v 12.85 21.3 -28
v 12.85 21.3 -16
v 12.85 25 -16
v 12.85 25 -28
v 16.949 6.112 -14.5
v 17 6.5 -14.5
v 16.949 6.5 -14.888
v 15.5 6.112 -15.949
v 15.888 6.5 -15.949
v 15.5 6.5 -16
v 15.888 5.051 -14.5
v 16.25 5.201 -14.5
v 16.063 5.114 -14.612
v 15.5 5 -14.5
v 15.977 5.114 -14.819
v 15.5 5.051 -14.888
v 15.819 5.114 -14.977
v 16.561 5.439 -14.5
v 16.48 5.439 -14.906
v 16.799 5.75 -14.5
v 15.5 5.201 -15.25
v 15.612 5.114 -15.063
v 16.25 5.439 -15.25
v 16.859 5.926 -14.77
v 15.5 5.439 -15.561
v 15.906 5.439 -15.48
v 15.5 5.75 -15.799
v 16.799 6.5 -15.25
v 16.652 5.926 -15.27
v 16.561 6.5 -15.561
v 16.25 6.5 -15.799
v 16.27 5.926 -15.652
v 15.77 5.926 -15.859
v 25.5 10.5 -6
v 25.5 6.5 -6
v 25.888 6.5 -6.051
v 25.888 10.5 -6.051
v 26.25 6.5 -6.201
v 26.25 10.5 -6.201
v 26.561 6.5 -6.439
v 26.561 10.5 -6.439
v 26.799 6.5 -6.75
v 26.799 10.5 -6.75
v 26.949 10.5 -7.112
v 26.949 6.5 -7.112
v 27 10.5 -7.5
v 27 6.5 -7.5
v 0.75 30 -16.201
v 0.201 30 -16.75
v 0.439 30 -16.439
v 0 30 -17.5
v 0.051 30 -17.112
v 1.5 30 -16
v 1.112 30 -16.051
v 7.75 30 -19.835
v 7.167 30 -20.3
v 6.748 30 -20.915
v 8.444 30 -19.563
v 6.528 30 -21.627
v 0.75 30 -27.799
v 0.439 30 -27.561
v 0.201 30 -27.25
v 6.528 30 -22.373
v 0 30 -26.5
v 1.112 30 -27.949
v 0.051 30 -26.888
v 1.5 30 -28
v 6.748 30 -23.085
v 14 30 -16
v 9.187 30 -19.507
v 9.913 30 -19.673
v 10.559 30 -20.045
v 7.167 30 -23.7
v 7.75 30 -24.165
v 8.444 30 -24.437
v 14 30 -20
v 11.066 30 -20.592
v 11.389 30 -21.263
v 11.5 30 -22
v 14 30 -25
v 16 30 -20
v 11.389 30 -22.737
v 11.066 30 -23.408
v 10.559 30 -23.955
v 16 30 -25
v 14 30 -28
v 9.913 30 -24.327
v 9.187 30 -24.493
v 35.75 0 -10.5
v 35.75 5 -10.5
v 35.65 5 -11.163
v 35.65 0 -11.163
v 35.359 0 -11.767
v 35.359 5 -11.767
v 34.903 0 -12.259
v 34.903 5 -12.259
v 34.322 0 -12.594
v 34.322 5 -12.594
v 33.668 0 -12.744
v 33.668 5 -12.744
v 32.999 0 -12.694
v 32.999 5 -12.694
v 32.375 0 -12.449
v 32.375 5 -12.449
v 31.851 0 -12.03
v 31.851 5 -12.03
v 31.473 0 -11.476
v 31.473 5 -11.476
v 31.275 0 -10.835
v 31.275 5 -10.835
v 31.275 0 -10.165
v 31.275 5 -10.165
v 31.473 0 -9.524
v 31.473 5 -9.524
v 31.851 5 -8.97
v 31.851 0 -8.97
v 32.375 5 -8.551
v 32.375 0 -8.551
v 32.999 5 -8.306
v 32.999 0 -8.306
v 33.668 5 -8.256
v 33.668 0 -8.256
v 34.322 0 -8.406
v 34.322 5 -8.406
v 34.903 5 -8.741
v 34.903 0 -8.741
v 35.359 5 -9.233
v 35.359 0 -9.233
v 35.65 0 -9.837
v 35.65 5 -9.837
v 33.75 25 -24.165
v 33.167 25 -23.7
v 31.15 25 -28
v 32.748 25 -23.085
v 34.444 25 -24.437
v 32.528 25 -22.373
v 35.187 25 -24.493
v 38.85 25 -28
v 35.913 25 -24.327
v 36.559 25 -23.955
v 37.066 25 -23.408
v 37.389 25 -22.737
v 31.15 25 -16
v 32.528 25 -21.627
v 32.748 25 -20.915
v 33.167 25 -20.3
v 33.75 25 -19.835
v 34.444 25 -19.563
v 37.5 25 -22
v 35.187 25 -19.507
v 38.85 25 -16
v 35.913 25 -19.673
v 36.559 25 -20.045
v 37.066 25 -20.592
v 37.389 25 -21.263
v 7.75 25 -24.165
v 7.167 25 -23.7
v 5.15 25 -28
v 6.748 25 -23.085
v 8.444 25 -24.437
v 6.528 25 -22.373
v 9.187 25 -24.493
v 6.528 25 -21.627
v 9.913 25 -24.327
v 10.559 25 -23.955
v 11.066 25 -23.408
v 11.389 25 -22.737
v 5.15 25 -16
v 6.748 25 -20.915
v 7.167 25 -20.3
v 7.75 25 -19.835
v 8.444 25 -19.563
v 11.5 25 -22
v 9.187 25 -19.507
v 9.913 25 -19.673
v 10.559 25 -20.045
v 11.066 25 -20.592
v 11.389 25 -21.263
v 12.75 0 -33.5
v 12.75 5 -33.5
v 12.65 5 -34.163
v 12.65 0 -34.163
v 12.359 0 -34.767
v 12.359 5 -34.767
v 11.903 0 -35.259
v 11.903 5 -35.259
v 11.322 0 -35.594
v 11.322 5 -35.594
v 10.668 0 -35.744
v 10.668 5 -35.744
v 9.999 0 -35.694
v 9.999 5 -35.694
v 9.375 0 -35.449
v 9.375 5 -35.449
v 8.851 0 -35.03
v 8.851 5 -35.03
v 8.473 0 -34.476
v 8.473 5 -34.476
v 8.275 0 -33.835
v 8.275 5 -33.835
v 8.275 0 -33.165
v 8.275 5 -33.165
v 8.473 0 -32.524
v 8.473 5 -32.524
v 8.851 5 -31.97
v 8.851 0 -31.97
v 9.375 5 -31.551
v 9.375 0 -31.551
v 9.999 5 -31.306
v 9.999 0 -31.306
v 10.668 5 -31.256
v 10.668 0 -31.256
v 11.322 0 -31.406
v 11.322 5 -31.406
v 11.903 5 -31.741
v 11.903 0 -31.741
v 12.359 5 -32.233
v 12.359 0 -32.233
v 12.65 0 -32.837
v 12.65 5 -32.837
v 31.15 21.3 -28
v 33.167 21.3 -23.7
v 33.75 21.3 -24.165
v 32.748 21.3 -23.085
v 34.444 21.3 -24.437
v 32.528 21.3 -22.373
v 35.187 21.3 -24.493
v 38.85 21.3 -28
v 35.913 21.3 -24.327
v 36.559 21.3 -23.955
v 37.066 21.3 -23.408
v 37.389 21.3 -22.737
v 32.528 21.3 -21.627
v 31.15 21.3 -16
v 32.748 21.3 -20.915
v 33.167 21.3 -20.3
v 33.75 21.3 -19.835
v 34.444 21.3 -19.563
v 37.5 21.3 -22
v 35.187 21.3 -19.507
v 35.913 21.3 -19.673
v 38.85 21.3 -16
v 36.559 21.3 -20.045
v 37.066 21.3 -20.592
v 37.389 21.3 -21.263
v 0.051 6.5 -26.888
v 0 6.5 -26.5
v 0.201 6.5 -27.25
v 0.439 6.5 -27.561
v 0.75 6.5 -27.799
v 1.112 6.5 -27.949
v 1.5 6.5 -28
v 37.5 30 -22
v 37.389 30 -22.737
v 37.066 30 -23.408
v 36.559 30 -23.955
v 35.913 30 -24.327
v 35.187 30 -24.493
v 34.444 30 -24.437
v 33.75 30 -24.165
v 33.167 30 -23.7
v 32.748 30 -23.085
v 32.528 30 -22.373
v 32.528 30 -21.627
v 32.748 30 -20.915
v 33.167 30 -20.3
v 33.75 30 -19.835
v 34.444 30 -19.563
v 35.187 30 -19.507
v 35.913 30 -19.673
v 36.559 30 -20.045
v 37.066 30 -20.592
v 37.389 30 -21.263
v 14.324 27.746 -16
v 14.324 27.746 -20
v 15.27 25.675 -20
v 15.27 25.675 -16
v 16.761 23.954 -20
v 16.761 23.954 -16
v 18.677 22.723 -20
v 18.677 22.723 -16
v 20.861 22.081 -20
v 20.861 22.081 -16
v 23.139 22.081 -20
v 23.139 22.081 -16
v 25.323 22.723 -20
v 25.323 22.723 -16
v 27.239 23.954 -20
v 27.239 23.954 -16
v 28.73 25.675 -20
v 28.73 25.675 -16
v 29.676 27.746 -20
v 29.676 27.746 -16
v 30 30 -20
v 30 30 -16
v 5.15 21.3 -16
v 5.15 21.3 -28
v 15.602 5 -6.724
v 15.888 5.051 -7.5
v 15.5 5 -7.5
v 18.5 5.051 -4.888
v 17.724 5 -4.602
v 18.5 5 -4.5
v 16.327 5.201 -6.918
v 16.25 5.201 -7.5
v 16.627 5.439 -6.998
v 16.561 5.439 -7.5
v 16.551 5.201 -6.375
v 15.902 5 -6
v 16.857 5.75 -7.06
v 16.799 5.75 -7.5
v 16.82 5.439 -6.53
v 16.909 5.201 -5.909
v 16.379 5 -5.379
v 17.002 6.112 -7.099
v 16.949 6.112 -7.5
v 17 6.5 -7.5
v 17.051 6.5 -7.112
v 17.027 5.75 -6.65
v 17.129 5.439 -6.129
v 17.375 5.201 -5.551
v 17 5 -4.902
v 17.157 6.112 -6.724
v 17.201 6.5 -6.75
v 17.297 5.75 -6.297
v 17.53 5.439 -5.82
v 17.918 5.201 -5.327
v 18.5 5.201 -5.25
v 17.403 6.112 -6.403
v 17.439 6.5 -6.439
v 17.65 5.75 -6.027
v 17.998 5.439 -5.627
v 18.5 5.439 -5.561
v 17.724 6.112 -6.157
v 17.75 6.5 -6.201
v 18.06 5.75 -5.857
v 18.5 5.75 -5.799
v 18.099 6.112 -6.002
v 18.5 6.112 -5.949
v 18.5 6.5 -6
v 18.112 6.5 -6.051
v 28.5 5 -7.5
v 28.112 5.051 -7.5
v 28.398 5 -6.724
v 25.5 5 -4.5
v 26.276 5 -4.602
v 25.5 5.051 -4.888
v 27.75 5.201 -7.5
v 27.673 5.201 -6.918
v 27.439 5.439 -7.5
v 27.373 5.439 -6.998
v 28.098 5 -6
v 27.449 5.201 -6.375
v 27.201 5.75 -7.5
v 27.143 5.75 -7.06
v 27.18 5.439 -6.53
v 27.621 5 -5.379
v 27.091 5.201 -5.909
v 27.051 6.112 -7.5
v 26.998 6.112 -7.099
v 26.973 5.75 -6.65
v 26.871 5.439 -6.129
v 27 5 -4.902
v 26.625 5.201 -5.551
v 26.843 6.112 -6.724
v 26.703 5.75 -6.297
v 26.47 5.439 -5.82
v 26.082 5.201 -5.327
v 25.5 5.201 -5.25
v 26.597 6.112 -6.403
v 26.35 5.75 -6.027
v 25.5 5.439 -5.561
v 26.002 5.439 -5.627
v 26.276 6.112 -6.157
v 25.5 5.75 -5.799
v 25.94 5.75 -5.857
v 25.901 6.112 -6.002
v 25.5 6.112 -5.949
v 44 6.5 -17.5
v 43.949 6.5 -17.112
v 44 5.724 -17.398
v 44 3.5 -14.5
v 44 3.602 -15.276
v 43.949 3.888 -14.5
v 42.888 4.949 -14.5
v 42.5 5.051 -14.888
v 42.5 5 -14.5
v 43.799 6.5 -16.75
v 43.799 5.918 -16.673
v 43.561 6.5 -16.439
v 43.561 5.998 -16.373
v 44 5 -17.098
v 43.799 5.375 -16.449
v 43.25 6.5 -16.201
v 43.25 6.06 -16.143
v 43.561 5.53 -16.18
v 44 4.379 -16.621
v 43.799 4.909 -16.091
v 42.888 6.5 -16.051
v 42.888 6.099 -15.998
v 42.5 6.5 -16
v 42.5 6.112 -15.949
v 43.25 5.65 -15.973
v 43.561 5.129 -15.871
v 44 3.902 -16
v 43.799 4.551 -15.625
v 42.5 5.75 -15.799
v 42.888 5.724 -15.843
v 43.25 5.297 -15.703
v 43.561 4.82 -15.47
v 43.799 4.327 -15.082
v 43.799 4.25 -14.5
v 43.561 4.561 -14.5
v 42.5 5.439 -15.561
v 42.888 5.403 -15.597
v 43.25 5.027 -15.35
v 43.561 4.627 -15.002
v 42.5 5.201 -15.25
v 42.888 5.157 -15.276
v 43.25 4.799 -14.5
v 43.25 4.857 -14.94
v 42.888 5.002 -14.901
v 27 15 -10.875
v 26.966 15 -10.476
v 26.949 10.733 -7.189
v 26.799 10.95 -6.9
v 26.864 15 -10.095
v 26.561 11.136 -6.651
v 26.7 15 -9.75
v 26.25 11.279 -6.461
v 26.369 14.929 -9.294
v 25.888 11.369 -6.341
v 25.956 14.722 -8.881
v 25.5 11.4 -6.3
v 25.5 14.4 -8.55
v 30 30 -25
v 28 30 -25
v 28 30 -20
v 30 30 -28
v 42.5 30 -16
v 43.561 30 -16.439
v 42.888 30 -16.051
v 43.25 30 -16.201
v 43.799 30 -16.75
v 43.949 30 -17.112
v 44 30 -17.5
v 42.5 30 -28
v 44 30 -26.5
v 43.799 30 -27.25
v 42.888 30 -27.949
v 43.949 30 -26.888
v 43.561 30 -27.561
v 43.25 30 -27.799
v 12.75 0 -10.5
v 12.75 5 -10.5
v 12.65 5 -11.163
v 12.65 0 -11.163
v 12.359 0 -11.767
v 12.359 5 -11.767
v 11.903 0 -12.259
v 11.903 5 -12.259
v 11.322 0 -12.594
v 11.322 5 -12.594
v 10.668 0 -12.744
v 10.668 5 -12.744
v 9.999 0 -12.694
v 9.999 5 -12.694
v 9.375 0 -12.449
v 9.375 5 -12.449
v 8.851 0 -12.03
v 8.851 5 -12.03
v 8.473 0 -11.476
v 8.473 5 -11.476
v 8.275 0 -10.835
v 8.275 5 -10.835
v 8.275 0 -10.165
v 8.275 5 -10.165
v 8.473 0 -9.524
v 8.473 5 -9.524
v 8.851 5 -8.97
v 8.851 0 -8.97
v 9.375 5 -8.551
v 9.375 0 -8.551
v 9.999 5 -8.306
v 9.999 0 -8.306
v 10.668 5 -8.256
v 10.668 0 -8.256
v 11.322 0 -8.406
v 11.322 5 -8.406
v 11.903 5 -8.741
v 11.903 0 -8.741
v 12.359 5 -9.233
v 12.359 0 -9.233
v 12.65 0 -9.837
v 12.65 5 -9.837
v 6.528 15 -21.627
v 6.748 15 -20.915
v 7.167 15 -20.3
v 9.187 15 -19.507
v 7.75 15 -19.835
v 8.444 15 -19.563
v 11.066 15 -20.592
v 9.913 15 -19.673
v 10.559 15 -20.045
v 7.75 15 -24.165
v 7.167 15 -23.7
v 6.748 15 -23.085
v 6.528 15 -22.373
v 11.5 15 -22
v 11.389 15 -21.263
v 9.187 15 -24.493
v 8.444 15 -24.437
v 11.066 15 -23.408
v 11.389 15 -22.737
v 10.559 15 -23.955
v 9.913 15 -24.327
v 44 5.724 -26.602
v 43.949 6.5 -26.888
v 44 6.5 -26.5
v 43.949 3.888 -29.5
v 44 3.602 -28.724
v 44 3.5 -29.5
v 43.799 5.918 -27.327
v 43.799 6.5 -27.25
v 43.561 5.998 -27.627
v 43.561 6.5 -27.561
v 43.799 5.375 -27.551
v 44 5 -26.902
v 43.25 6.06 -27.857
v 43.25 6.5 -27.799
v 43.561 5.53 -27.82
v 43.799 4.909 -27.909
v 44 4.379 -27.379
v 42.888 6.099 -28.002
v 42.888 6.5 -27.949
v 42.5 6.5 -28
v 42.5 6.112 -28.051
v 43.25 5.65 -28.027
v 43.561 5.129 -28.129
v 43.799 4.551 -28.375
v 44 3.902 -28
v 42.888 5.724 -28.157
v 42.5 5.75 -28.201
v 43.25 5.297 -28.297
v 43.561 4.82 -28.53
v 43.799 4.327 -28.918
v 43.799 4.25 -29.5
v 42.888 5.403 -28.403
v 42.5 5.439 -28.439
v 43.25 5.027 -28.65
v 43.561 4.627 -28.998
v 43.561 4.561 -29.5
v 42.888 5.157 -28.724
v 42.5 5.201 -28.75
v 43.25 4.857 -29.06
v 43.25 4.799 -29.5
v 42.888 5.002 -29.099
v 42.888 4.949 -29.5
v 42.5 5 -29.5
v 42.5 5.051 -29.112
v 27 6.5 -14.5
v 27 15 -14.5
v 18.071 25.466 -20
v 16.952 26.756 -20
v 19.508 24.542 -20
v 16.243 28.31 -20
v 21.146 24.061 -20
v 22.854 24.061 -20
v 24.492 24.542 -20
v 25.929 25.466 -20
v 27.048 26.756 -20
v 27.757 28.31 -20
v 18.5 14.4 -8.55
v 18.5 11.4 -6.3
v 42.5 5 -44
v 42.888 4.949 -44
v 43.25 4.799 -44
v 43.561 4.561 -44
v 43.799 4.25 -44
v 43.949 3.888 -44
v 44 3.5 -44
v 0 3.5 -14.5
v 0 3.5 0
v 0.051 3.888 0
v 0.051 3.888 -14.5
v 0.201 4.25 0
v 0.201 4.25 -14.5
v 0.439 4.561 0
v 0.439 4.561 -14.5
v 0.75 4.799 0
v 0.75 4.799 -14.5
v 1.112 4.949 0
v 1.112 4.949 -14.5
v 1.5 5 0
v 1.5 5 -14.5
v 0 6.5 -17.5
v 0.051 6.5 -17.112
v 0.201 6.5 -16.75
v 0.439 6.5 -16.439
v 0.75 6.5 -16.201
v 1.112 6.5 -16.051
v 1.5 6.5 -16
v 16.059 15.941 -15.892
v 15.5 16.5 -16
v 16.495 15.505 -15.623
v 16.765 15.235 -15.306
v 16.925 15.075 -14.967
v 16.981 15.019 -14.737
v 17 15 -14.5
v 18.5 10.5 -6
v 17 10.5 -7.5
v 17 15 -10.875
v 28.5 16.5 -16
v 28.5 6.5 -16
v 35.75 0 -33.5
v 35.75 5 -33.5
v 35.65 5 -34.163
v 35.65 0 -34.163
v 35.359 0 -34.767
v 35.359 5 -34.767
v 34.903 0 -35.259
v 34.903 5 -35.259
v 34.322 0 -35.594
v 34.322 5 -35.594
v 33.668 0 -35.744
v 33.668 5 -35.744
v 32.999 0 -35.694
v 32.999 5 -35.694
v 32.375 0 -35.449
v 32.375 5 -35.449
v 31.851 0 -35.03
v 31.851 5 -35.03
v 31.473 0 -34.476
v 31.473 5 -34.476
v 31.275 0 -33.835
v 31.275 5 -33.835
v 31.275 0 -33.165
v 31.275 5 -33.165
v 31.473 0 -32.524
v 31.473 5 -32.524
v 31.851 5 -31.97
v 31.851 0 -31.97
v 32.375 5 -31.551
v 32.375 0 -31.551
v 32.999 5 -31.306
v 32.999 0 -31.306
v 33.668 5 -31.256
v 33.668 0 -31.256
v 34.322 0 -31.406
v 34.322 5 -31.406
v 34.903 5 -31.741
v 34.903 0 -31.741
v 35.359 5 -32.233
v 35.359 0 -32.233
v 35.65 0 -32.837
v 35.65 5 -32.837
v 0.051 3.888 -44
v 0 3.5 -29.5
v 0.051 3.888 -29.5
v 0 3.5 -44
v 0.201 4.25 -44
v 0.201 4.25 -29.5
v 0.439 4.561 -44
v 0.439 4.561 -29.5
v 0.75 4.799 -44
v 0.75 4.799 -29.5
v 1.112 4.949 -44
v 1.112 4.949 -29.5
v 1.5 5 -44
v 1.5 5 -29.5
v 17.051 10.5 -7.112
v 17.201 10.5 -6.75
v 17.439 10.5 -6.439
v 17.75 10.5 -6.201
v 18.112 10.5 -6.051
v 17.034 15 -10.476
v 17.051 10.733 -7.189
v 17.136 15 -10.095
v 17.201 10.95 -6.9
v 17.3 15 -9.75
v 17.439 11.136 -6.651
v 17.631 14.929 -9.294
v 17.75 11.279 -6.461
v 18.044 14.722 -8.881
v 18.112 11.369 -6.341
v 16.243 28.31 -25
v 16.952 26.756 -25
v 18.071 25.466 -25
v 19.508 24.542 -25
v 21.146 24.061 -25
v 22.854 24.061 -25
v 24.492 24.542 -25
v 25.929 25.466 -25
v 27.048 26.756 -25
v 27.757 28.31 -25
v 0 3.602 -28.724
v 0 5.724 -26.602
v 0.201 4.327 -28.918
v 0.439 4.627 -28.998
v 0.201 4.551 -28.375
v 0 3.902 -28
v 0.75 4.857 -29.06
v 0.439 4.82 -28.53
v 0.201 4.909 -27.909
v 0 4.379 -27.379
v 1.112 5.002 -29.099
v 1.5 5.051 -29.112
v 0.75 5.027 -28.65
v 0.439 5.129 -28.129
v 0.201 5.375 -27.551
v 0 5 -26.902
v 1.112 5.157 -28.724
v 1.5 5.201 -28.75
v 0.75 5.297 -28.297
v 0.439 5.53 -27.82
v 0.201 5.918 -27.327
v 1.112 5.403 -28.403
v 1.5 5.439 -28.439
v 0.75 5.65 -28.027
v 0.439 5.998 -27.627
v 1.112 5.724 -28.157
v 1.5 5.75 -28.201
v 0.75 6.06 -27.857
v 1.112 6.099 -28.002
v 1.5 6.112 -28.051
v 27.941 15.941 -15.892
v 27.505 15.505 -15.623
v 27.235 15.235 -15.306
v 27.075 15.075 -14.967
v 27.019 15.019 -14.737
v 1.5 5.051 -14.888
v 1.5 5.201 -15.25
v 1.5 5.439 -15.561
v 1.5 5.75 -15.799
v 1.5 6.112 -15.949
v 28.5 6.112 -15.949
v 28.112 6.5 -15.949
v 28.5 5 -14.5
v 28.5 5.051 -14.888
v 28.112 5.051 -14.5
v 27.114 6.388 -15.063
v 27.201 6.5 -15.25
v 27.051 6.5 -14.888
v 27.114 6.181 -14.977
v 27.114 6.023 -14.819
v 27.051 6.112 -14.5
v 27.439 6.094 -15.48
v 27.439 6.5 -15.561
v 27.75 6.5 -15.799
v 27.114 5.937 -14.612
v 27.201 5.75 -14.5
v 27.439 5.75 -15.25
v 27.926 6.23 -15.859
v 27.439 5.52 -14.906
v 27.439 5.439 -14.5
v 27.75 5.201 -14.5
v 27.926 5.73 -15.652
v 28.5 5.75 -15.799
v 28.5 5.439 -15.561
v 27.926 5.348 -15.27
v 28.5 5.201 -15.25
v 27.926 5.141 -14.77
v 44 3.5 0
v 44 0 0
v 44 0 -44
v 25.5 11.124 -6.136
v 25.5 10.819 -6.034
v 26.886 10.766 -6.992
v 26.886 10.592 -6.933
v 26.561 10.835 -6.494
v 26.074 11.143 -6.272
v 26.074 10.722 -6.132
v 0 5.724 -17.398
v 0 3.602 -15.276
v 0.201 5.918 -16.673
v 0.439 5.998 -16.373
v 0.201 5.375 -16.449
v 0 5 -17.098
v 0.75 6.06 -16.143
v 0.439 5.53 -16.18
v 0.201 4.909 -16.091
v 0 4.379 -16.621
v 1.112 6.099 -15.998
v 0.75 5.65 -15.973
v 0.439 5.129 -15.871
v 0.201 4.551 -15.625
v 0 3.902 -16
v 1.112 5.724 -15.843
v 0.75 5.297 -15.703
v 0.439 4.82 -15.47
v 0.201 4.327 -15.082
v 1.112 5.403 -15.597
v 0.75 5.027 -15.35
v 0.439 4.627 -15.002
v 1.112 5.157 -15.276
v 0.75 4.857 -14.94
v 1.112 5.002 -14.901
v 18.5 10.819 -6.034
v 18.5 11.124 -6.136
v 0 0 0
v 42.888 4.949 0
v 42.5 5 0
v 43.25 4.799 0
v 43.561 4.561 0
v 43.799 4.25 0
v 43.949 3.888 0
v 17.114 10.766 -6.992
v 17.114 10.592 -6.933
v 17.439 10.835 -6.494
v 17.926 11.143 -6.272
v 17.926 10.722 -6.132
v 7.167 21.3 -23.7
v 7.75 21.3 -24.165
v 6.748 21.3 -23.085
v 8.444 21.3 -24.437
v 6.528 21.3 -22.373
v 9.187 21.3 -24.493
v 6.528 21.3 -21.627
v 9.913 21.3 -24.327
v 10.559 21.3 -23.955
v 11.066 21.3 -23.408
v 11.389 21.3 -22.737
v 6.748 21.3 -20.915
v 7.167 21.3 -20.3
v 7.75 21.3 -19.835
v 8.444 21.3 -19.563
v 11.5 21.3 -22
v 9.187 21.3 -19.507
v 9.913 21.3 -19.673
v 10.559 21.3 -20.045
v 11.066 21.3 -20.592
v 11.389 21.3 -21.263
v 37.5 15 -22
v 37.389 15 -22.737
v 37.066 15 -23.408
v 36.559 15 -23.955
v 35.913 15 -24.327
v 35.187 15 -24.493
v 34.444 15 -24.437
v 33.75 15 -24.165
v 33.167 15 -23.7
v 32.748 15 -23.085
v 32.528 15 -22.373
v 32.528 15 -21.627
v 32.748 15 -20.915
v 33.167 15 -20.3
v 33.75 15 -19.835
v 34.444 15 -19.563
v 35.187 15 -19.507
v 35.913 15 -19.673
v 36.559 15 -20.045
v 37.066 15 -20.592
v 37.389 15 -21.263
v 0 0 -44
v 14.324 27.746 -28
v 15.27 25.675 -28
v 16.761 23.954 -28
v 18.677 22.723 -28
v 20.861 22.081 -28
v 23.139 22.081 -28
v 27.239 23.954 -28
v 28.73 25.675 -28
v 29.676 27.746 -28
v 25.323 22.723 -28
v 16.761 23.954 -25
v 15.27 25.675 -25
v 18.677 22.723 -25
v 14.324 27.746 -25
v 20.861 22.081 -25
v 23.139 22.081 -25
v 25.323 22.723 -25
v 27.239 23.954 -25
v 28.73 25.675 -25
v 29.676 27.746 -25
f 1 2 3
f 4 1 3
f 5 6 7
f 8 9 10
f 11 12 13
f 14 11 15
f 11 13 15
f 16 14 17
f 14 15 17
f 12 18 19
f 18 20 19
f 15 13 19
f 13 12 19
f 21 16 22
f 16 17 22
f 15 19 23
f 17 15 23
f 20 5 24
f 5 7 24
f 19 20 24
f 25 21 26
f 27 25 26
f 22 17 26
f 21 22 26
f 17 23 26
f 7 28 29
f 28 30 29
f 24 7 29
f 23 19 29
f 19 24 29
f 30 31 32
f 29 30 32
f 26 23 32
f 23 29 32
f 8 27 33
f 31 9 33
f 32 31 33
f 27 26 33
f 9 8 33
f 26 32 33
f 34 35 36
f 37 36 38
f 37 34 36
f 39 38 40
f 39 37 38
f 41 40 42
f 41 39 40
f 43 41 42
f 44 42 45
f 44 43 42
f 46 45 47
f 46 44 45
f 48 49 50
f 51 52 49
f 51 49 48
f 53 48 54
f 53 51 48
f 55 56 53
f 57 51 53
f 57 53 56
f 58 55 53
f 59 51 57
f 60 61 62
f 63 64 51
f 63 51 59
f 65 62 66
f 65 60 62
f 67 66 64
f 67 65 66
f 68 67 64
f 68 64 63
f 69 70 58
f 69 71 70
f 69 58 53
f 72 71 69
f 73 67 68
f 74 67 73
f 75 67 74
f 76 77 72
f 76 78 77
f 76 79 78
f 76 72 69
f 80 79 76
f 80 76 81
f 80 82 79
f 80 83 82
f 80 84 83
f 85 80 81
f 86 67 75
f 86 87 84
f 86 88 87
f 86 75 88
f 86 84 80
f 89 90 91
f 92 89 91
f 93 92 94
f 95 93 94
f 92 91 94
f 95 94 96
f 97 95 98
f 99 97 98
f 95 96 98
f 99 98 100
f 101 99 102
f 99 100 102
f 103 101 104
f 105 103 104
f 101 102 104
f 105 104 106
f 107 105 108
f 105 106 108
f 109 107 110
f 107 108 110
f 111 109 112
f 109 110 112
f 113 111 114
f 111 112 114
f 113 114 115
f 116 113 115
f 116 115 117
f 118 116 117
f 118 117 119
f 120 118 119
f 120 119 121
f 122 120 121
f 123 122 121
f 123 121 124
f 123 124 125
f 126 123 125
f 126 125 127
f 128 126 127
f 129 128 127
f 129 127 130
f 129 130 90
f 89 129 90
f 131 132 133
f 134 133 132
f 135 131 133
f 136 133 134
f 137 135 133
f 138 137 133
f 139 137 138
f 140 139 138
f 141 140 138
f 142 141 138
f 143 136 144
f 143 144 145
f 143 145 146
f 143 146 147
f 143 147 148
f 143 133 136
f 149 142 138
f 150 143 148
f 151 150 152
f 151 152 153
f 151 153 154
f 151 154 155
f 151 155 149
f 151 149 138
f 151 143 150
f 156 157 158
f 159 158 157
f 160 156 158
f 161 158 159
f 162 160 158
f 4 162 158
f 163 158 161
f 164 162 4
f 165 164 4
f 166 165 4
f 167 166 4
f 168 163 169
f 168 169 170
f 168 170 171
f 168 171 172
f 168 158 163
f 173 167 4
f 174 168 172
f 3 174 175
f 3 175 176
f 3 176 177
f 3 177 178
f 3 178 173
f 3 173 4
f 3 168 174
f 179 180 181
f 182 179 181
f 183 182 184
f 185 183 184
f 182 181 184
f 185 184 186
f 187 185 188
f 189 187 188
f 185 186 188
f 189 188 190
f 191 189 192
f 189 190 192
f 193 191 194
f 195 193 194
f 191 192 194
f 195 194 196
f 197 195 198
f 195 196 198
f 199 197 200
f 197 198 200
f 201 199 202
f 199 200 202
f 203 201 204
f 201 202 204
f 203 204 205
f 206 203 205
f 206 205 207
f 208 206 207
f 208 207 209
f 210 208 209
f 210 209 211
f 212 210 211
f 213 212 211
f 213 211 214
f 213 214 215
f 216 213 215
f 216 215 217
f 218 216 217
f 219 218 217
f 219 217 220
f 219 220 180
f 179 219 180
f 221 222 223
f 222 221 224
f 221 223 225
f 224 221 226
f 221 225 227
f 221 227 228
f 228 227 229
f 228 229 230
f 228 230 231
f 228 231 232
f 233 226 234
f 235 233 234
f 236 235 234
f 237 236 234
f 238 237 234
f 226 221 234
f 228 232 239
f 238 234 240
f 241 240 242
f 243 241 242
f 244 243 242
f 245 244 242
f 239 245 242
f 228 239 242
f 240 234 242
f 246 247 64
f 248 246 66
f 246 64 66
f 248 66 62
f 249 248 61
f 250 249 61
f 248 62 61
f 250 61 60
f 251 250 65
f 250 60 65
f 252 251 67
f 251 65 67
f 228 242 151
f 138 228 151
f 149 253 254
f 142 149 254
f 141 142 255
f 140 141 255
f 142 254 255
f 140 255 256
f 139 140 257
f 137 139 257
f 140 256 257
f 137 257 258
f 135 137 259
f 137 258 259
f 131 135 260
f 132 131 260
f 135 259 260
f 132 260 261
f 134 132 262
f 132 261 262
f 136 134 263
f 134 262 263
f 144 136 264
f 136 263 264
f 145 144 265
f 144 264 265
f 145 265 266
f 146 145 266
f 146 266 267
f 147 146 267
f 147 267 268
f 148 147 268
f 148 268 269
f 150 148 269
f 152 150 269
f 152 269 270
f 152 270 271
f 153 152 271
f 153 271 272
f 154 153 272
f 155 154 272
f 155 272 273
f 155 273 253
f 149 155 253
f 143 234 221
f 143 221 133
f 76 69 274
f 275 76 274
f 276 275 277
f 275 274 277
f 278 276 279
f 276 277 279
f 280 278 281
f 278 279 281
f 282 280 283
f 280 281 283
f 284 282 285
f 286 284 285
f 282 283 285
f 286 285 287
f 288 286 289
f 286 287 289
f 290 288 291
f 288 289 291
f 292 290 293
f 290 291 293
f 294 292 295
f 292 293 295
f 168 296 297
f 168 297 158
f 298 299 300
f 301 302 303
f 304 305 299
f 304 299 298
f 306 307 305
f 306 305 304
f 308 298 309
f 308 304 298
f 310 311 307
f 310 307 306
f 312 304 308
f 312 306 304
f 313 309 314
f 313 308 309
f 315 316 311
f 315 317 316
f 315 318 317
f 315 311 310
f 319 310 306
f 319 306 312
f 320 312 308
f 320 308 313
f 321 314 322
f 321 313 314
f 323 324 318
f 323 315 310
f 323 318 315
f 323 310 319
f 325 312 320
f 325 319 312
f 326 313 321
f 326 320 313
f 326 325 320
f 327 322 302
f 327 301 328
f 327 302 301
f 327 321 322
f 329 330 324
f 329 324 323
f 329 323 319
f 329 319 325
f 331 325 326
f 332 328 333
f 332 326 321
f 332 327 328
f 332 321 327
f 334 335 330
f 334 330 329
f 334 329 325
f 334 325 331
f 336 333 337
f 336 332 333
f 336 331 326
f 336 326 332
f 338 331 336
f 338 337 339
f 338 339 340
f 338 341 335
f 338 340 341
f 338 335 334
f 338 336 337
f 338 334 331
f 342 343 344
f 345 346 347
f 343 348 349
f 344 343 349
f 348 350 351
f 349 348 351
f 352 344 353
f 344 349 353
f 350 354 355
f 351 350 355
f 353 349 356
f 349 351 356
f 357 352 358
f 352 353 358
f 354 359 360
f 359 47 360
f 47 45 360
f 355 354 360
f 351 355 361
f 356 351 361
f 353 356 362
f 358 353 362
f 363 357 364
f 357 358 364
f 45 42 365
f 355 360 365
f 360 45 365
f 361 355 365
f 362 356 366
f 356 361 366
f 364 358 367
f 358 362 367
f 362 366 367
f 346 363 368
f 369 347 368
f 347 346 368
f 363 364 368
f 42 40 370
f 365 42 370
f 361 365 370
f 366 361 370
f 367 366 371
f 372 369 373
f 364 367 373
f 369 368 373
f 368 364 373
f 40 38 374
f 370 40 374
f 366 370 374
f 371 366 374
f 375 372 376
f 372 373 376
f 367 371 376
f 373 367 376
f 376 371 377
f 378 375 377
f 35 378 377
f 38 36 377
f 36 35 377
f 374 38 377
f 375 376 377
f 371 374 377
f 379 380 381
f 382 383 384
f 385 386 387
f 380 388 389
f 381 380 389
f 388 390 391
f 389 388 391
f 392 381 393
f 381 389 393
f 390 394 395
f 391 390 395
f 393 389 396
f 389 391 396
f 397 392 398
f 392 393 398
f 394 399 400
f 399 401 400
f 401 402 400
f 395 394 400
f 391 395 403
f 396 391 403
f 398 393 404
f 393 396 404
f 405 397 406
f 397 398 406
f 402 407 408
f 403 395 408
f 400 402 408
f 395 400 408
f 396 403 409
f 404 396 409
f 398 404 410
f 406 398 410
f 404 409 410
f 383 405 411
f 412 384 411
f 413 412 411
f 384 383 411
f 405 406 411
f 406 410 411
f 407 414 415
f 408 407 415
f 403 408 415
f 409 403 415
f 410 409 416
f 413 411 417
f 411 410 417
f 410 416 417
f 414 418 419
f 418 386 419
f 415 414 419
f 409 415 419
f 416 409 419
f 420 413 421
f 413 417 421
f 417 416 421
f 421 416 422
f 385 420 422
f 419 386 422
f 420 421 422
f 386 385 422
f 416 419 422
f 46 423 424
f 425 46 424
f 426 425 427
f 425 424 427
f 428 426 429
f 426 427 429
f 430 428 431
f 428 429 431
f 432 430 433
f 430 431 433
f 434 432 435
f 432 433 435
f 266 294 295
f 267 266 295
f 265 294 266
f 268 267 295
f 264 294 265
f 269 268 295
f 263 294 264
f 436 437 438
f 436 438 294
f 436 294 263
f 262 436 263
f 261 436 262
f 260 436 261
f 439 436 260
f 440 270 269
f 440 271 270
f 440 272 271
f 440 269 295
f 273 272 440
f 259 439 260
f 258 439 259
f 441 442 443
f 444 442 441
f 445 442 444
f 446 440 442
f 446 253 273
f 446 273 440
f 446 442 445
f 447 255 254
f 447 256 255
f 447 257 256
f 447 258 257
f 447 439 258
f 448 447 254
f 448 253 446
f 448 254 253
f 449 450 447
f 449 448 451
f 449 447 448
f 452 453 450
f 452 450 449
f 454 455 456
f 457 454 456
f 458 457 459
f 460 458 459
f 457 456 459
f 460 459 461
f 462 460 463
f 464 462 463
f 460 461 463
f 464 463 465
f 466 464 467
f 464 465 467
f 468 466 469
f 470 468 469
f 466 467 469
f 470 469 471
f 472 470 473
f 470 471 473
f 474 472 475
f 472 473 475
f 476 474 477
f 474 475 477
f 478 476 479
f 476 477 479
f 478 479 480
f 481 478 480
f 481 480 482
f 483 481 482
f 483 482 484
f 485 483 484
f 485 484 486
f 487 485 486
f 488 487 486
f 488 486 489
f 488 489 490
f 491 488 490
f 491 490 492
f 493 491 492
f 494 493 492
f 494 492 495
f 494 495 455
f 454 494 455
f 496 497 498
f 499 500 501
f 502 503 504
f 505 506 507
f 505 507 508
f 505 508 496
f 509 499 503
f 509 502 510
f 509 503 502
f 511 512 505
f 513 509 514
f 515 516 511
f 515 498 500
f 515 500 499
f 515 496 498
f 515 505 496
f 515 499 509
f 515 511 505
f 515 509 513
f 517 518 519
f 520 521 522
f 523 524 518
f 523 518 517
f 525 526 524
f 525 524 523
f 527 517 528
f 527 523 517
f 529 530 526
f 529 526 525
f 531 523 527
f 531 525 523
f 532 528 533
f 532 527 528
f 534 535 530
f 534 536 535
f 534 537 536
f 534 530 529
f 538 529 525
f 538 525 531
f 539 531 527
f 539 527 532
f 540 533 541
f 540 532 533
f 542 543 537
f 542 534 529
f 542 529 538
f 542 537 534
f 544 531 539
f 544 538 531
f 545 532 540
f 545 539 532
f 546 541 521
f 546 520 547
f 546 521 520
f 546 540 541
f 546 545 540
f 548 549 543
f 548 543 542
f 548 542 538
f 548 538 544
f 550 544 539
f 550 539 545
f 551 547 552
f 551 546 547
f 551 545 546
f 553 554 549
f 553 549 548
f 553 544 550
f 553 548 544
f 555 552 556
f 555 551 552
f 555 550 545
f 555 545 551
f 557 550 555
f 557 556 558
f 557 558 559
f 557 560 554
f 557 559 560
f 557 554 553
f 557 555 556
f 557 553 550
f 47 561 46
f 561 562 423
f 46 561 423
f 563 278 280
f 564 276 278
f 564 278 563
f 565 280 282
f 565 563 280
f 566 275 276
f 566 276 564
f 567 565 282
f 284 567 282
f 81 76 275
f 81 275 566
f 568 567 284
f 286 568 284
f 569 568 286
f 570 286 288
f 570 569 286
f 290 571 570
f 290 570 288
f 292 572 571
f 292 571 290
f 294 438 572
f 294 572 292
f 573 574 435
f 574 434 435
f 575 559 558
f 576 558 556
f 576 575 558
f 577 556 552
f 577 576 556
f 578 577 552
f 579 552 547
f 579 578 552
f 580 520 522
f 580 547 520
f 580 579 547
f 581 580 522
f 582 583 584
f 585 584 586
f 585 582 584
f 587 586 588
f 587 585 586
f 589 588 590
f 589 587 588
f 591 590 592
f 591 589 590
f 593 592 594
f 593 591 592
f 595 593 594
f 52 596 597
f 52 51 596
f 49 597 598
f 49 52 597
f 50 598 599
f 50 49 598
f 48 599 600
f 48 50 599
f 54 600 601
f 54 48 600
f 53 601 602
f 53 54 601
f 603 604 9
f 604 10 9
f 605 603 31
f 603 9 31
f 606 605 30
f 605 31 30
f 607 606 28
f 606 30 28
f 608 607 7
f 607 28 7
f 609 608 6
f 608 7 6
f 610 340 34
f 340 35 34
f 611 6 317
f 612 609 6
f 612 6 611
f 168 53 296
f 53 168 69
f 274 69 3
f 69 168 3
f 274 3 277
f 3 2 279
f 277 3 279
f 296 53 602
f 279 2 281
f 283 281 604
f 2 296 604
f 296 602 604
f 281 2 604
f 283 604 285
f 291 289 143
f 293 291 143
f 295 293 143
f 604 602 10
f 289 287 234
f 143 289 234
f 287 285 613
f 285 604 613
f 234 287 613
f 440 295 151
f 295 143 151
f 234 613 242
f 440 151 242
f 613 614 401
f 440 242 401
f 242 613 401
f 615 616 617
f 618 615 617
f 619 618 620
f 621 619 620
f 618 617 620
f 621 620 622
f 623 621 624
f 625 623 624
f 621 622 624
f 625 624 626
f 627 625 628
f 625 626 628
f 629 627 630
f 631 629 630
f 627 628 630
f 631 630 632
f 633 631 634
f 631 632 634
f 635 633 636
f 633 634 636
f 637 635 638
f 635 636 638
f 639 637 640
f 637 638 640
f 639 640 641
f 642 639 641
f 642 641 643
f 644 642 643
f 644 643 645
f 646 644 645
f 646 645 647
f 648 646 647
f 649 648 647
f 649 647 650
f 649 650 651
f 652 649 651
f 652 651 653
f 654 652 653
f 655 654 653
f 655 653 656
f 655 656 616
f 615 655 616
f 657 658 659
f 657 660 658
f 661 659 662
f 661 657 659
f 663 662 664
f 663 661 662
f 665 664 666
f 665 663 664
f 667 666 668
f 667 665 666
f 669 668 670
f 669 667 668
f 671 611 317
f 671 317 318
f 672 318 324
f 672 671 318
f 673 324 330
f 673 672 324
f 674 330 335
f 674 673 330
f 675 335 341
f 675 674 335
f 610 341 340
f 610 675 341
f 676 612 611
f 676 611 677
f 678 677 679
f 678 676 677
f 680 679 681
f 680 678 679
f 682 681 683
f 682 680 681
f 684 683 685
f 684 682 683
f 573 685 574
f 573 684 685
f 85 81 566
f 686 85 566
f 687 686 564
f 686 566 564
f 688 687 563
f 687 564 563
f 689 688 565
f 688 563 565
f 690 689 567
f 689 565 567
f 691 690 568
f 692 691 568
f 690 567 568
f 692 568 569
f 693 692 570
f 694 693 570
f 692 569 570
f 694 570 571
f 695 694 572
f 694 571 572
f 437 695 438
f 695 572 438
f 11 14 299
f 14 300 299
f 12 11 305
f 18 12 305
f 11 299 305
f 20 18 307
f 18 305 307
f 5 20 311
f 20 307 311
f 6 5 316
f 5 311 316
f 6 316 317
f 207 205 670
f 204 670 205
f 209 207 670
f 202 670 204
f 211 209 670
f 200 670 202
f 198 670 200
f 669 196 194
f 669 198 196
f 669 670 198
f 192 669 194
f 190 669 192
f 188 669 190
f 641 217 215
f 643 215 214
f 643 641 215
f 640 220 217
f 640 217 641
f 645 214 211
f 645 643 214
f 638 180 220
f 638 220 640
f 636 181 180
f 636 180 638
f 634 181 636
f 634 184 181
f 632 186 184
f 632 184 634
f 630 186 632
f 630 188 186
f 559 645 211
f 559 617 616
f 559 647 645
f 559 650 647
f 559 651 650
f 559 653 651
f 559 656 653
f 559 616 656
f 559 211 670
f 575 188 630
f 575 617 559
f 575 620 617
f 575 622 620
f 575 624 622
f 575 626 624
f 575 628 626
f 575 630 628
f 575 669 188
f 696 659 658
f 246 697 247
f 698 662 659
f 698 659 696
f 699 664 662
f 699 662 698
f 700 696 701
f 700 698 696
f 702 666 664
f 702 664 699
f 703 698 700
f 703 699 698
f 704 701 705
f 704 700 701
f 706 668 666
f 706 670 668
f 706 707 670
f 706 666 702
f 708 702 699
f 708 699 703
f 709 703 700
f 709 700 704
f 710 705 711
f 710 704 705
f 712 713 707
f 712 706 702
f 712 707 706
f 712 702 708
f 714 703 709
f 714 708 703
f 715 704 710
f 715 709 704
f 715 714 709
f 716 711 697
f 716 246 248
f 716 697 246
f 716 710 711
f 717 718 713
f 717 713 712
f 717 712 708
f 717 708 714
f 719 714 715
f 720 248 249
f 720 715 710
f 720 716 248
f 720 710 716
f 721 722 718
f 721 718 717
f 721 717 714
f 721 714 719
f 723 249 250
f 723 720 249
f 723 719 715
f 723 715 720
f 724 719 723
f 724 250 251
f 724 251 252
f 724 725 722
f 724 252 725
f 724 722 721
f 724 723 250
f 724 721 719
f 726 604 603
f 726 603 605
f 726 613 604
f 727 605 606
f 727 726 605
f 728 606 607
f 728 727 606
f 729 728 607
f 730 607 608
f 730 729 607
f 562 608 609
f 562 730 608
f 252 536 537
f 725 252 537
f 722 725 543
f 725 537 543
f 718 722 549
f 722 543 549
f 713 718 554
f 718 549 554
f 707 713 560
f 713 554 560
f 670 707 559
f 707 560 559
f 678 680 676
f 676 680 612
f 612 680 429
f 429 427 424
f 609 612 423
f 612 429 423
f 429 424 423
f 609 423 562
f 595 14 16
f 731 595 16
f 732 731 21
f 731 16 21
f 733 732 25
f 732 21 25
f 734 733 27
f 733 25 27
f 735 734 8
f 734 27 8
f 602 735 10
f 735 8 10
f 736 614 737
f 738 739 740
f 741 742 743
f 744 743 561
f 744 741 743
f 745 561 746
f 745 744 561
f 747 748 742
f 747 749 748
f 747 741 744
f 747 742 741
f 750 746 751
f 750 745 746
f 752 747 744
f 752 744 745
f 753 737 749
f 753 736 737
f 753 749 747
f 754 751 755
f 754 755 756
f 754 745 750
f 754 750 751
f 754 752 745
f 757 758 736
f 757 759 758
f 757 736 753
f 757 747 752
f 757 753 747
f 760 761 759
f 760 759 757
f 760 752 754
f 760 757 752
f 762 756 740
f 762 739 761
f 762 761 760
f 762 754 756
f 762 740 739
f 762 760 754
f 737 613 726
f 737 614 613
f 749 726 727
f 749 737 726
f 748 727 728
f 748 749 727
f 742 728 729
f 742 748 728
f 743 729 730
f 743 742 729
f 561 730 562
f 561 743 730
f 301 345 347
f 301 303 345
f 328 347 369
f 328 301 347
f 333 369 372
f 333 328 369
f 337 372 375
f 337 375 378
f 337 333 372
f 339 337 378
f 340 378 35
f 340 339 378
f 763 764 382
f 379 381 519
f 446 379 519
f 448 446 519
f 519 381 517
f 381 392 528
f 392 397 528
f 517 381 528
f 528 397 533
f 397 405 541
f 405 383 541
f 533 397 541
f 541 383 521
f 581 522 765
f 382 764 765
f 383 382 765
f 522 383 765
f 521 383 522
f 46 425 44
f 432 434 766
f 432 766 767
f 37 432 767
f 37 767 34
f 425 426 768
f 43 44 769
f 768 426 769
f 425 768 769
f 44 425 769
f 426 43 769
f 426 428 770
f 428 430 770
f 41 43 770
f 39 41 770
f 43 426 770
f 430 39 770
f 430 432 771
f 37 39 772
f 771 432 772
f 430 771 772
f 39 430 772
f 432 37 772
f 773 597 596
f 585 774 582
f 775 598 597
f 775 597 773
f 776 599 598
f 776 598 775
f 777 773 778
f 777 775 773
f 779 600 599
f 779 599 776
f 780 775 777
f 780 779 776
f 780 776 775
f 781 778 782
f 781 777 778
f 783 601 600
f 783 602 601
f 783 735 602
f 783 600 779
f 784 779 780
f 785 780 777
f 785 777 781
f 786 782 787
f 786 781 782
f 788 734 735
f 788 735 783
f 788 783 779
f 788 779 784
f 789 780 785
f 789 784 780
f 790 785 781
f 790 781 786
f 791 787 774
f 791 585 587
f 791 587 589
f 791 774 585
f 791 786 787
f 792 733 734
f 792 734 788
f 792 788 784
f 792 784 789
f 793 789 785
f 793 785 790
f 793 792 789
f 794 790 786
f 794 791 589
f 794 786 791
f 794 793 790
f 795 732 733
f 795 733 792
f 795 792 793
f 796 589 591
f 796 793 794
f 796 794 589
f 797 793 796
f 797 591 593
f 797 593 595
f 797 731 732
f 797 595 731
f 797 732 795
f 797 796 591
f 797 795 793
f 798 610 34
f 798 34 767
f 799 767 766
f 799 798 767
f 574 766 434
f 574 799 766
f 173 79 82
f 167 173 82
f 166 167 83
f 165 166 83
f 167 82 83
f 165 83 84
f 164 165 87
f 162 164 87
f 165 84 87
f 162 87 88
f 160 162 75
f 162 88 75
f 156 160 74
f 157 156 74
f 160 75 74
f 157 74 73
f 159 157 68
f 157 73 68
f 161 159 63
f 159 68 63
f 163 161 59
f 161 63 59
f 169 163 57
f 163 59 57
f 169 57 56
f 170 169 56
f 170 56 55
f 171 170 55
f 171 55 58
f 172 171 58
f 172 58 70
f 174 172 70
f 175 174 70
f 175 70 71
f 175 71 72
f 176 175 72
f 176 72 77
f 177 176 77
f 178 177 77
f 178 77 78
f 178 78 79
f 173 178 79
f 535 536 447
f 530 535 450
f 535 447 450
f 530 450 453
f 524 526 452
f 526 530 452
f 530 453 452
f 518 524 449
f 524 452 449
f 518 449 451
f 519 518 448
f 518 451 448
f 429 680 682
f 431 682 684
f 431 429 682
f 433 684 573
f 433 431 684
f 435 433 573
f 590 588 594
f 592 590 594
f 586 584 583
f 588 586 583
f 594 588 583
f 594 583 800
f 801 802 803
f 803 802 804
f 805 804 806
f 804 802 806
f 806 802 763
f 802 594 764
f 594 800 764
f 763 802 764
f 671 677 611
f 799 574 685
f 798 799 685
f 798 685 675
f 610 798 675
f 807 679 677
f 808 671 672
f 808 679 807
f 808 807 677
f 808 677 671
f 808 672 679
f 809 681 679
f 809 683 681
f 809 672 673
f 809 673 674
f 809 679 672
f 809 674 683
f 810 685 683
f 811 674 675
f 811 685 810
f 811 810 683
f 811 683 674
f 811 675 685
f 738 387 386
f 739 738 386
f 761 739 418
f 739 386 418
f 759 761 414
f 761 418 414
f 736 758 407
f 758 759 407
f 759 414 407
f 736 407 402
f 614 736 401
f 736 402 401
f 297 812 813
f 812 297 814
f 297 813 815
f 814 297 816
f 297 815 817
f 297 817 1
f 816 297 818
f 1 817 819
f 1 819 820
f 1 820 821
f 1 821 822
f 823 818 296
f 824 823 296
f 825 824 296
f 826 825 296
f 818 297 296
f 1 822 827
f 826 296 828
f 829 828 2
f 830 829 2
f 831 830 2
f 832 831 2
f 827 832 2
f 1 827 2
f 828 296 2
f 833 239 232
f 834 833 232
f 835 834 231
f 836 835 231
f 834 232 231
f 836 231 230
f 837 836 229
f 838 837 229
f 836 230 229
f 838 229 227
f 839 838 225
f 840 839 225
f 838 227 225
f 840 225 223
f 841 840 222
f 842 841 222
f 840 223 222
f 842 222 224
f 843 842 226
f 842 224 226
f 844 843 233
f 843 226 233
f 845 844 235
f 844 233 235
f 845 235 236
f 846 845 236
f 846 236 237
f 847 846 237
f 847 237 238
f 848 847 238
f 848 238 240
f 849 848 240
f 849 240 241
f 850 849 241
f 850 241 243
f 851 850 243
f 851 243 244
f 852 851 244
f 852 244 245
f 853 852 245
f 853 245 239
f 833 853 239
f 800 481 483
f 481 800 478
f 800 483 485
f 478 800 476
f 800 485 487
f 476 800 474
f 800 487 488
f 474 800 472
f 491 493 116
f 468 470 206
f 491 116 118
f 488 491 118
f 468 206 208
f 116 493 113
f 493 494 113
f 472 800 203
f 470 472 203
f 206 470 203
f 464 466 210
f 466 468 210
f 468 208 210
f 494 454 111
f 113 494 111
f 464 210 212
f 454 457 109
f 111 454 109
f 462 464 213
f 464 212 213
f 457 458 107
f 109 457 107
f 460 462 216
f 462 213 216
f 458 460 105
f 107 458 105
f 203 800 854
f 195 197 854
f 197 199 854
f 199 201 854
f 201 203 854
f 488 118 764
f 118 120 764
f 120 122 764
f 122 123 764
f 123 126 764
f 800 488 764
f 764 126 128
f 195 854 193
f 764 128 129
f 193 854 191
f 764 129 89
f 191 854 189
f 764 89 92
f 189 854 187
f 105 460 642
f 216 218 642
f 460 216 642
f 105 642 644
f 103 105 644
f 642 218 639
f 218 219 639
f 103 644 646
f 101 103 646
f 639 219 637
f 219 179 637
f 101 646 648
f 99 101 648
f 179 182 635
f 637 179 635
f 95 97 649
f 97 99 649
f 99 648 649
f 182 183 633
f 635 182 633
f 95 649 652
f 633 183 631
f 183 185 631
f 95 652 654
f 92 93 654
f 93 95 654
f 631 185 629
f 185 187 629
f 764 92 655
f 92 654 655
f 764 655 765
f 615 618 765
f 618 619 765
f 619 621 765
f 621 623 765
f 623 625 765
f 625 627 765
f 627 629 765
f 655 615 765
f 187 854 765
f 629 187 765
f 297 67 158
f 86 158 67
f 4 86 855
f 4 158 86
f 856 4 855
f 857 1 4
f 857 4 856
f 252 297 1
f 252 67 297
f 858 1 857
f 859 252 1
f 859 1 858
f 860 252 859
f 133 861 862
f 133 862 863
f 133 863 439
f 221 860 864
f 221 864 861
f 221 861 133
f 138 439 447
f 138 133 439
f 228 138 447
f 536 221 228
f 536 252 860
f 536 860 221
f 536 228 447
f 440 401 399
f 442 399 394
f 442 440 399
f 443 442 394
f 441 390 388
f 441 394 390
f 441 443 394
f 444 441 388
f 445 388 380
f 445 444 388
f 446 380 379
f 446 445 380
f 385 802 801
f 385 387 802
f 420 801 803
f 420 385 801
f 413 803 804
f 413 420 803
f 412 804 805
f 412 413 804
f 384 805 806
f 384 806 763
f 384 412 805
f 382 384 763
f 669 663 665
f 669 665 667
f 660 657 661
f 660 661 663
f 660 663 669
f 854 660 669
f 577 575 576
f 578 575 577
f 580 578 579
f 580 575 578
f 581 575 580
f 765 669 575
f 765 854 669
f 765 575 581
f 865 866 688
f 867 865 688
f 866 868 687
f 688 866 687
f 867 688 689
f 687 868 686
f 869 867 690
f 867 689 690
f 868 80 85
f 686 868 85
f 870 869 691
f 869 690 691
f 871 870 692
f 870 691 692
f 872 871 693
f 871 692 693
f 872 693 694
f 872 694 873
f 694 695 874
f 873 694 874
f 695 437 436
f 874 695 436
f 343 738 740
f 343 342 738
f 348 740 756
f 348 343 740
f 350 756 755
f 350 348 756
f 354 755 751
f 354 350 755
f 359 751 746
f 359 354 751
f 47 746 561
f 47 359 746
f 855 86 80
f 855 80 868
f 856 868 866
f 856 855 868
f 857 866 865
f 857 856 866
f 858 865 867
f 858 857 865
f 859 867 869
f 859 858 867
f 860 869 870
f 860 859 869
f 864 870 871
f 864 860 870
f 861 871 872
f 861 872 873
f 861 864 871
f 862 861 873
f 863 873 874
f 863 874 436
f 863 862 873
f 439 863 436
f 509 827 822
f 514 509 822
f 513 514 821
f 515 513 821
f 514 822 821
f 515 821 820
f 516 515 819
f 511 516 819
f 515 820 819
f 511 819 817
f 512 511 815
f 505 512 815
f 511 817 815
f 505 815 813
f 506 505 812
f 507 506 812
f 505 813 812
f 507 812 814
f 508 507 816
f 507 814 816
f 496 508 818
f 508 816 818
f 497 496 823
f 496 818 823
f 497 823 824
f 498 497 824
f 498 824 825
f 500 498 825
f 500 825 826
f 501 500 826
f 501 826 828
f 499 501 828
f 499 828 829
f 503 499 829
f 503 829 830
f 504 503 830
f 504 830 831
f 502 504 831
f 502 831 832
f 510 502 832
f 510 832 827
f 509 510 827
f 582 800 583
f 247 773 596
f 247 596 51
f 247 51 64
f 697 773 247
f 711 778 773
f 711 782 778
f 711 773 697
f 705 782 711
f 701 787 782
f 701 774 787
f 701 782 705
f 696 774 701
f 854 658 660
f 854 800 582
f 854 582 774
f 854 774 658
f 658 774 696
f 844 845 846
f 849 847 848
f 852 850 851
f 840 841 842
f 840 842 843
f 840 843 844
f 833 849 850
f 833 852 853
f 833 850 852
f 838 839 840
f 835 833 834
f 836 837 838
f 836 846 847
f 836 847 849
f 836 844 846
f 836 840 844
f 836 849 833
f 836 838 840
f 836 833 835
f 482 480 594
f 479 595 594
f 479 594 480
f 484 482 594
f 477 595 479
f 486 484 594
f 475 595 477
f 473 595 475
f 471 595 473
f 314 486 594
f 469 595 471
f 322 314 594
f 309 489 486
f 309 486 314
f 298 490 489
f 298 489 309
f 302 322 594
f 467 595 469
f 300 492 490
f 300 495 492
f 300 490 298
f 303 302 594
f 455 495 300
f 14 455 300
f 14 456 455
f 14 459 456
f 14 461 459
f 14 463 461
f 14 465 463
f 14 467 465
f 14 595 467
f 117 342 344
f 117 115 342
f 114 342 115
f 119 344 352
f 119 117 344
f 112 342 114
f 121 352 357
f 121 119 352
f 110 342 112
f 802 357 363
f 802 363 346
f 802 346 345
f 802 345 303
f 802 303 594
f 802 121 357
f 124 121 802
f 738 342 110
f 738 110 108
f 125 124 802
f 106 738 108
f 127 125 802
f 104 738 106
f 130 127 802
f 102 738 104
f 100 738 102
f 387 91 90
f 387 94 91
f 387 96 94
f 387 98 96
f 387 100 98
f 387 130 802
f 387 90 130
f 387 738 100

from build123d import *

# Parameters (mm, degrees)
SKETCH1_W           = 44
SKETCH1_H           = 44
BOSS_EXTRUDE1_DEPTH = 5
SKETCH2_W           = 44
SKETCH2_H           = 12
BOSS_EXTRUDE2_DEPTH = 25
SKETCH3_R           = 2.5
CUT_EXTRUDE1_DEPTH  = 15
SKETCH4_W           = 7.7
SKETCH4_H           = 3.7
CUT_EXTRUDE2_DEPTH  = 29
SKETCH6_R           = 8
CUT_EXTRUDE3_DEPTH  = 4
CUT_EXTRUDE4_DEPTH  = 3
BOSS_EXTRUDE3_DEPTH = 5
SKETCH10_R          = 2.25
CUT_EXTRUDE5_DEPTH  = 10
FILLET2_R           = 1.5


with BuildPart() as part:
    # Sketch1 → Boss-Extrude1 (new body)
    with BuildSketch(Plane(origin=(0, 0, 0), x_dir=(1, 0, 0), z_dir=(0, 1, 0))):
        with Locations((22, 22)):
            Rectangle(SKETCH1_W, SKETCH1_H)
    extrude(amount=BOSS_EXTRUDE1_DEPTH)

    # Sketch2 → Boss-Extrude2 (add)
    with BuildSketch(Plane(origin=(0, 5, 0), x_dir=(1, 0, 0), z_dir=(0, 1, 0))):
        with Locations((22, 22)):
            Rectangle(SKETCH2_W, SKETCH2_H)
    extrude(amount=BOSS_EXTRUDE2_DEPTH)

    # Sketch3 → Cut-Extrude1 (cut)
    with BuildSketch(Plane(origin=(0, 30, 0), x_dir=(1, 0, 0), z_dir=(0, 1, 0))):
        with Locations((35, 22)):
            Circle(SKETCH3_R)
        with Locations((9, 22)):
            Circle(SKETCH3_R)
    extrude(amount=-CUT_EXTRUDE1_DEPTH, mode=Mode.SUBTRACT)

    # Sketch4 → Cut-Extrude2 (cut, through all)
    with BuildSketch(Plane.XY.offset(-16)):
        with Locations((9, 23.15)):
            Rectangle(SKETCH4_W, SKETCH4_H)
        with BuildLine():
            Line((16, 30), (28, 30))
            ThreePointArc((28, 30), (22, 36), (16, 30))
        make_face()
        with BuildLine():
            ThreePointArc((16, 30), (22, 24), (28, 30))
            Line((28, 30), (16, 30))
        make_face()
        with Locations((35, 23.15)):
            Rectangle(SKETCH4_W, SKETCH4_H)
    extrude(amount=-CUT_EXTRUDE2_DEPTH, mode=Mode.SUBTRACT)

    # Sketch6 → Cut-Extrude3 (cut)
    with BuildSketch(Plane.XY.offset(-16)):
        with Locations((22, 30)):
            Circle(SKETCH6_R)
    extrude(amount=-CUT_EXTRUDE3_DEPTH, mode=Mode.SUBTRACT)

    # Sketch7 → Cut-Extrude4 (cut)
    with BuildSketch(Plane(origin=(0, 0, -28), x_dir=(-1, 0, 0), z_dir=(0, 0, -1))):
        with BuildLine():
            Line((-30, 30), (-14, 30))
            ThreePointArc((-14, 30), (-22, 22), (-30, 30))
        make_face()
    extrude(amount=-CUT_EXTRUDE4_DEPTH, mode=Mode.SUBTRACT)

    # Sketch8 → Boss-Extrude3 (add, symmetric)
    with BuildSketch(Plane(origin=(22, 0, 0), x_dir=(0, 0, -1), z_dir=(1, 0, 0))):
        Polygon((16, 5), (6, 5), (6, 11), (9, 15), (16, 15), align=None)
    extrude(amount=BOSS_EXTRUDE3_DEPTH, both=True)

    # Sketch10 → Cut-Extrude5 (cut)
    with BuildSketch(Plane(origin=(0, 5, 0), x_dir=(1, 0, 0), z_dir=(0, 1, 0))):
        with Locations((33.5, 10.5)):
            Circle(SKETCH10_R)
        with Locations((10.5, 10.5)):
            Circle(SKETCH10_R)
        with Locations((33.5, 33.5)):
            Circle(SKETCH10_R)
        with Locations((10.5, 33.5)):
            Circle(SKETCH10_R)
    extrude(amount=-CUT_EXTRUDE5_DEPTH, mode=Mode.SUBTRACT)

    # Fillet2
    fillet2_edges = [part.edges().sort_by_distance(p)[0] for p in [
        (44, 5, -8),
        (35.5, 5, -16),
        (17, 10, -16),
        (22, 15, -16),
        (17, 13, -7.5),
        (22, 15, -9),
        (17, 8, -6),
        (22, 11, -6),
        (17, 5, -11),
        (22, 5, -6),
        (27, 10, -16),
        (27, 13, -7.5),
        (27, 8, -6),
        (27, 5, -11),
        (0, 5, -8),
        (44, 5, -36),
        (0, 17.5, -28),
        (8.5, 5, -16),
        (0, 17.5, -16),
        (44, 17.5, -16),
        (22, 5, -28),
        (44, 17.5, -28),
        (0, 5, -36),
    ]]
    fillet(fillet2_edges, radius=FILLET2_R)


solid = part.part
